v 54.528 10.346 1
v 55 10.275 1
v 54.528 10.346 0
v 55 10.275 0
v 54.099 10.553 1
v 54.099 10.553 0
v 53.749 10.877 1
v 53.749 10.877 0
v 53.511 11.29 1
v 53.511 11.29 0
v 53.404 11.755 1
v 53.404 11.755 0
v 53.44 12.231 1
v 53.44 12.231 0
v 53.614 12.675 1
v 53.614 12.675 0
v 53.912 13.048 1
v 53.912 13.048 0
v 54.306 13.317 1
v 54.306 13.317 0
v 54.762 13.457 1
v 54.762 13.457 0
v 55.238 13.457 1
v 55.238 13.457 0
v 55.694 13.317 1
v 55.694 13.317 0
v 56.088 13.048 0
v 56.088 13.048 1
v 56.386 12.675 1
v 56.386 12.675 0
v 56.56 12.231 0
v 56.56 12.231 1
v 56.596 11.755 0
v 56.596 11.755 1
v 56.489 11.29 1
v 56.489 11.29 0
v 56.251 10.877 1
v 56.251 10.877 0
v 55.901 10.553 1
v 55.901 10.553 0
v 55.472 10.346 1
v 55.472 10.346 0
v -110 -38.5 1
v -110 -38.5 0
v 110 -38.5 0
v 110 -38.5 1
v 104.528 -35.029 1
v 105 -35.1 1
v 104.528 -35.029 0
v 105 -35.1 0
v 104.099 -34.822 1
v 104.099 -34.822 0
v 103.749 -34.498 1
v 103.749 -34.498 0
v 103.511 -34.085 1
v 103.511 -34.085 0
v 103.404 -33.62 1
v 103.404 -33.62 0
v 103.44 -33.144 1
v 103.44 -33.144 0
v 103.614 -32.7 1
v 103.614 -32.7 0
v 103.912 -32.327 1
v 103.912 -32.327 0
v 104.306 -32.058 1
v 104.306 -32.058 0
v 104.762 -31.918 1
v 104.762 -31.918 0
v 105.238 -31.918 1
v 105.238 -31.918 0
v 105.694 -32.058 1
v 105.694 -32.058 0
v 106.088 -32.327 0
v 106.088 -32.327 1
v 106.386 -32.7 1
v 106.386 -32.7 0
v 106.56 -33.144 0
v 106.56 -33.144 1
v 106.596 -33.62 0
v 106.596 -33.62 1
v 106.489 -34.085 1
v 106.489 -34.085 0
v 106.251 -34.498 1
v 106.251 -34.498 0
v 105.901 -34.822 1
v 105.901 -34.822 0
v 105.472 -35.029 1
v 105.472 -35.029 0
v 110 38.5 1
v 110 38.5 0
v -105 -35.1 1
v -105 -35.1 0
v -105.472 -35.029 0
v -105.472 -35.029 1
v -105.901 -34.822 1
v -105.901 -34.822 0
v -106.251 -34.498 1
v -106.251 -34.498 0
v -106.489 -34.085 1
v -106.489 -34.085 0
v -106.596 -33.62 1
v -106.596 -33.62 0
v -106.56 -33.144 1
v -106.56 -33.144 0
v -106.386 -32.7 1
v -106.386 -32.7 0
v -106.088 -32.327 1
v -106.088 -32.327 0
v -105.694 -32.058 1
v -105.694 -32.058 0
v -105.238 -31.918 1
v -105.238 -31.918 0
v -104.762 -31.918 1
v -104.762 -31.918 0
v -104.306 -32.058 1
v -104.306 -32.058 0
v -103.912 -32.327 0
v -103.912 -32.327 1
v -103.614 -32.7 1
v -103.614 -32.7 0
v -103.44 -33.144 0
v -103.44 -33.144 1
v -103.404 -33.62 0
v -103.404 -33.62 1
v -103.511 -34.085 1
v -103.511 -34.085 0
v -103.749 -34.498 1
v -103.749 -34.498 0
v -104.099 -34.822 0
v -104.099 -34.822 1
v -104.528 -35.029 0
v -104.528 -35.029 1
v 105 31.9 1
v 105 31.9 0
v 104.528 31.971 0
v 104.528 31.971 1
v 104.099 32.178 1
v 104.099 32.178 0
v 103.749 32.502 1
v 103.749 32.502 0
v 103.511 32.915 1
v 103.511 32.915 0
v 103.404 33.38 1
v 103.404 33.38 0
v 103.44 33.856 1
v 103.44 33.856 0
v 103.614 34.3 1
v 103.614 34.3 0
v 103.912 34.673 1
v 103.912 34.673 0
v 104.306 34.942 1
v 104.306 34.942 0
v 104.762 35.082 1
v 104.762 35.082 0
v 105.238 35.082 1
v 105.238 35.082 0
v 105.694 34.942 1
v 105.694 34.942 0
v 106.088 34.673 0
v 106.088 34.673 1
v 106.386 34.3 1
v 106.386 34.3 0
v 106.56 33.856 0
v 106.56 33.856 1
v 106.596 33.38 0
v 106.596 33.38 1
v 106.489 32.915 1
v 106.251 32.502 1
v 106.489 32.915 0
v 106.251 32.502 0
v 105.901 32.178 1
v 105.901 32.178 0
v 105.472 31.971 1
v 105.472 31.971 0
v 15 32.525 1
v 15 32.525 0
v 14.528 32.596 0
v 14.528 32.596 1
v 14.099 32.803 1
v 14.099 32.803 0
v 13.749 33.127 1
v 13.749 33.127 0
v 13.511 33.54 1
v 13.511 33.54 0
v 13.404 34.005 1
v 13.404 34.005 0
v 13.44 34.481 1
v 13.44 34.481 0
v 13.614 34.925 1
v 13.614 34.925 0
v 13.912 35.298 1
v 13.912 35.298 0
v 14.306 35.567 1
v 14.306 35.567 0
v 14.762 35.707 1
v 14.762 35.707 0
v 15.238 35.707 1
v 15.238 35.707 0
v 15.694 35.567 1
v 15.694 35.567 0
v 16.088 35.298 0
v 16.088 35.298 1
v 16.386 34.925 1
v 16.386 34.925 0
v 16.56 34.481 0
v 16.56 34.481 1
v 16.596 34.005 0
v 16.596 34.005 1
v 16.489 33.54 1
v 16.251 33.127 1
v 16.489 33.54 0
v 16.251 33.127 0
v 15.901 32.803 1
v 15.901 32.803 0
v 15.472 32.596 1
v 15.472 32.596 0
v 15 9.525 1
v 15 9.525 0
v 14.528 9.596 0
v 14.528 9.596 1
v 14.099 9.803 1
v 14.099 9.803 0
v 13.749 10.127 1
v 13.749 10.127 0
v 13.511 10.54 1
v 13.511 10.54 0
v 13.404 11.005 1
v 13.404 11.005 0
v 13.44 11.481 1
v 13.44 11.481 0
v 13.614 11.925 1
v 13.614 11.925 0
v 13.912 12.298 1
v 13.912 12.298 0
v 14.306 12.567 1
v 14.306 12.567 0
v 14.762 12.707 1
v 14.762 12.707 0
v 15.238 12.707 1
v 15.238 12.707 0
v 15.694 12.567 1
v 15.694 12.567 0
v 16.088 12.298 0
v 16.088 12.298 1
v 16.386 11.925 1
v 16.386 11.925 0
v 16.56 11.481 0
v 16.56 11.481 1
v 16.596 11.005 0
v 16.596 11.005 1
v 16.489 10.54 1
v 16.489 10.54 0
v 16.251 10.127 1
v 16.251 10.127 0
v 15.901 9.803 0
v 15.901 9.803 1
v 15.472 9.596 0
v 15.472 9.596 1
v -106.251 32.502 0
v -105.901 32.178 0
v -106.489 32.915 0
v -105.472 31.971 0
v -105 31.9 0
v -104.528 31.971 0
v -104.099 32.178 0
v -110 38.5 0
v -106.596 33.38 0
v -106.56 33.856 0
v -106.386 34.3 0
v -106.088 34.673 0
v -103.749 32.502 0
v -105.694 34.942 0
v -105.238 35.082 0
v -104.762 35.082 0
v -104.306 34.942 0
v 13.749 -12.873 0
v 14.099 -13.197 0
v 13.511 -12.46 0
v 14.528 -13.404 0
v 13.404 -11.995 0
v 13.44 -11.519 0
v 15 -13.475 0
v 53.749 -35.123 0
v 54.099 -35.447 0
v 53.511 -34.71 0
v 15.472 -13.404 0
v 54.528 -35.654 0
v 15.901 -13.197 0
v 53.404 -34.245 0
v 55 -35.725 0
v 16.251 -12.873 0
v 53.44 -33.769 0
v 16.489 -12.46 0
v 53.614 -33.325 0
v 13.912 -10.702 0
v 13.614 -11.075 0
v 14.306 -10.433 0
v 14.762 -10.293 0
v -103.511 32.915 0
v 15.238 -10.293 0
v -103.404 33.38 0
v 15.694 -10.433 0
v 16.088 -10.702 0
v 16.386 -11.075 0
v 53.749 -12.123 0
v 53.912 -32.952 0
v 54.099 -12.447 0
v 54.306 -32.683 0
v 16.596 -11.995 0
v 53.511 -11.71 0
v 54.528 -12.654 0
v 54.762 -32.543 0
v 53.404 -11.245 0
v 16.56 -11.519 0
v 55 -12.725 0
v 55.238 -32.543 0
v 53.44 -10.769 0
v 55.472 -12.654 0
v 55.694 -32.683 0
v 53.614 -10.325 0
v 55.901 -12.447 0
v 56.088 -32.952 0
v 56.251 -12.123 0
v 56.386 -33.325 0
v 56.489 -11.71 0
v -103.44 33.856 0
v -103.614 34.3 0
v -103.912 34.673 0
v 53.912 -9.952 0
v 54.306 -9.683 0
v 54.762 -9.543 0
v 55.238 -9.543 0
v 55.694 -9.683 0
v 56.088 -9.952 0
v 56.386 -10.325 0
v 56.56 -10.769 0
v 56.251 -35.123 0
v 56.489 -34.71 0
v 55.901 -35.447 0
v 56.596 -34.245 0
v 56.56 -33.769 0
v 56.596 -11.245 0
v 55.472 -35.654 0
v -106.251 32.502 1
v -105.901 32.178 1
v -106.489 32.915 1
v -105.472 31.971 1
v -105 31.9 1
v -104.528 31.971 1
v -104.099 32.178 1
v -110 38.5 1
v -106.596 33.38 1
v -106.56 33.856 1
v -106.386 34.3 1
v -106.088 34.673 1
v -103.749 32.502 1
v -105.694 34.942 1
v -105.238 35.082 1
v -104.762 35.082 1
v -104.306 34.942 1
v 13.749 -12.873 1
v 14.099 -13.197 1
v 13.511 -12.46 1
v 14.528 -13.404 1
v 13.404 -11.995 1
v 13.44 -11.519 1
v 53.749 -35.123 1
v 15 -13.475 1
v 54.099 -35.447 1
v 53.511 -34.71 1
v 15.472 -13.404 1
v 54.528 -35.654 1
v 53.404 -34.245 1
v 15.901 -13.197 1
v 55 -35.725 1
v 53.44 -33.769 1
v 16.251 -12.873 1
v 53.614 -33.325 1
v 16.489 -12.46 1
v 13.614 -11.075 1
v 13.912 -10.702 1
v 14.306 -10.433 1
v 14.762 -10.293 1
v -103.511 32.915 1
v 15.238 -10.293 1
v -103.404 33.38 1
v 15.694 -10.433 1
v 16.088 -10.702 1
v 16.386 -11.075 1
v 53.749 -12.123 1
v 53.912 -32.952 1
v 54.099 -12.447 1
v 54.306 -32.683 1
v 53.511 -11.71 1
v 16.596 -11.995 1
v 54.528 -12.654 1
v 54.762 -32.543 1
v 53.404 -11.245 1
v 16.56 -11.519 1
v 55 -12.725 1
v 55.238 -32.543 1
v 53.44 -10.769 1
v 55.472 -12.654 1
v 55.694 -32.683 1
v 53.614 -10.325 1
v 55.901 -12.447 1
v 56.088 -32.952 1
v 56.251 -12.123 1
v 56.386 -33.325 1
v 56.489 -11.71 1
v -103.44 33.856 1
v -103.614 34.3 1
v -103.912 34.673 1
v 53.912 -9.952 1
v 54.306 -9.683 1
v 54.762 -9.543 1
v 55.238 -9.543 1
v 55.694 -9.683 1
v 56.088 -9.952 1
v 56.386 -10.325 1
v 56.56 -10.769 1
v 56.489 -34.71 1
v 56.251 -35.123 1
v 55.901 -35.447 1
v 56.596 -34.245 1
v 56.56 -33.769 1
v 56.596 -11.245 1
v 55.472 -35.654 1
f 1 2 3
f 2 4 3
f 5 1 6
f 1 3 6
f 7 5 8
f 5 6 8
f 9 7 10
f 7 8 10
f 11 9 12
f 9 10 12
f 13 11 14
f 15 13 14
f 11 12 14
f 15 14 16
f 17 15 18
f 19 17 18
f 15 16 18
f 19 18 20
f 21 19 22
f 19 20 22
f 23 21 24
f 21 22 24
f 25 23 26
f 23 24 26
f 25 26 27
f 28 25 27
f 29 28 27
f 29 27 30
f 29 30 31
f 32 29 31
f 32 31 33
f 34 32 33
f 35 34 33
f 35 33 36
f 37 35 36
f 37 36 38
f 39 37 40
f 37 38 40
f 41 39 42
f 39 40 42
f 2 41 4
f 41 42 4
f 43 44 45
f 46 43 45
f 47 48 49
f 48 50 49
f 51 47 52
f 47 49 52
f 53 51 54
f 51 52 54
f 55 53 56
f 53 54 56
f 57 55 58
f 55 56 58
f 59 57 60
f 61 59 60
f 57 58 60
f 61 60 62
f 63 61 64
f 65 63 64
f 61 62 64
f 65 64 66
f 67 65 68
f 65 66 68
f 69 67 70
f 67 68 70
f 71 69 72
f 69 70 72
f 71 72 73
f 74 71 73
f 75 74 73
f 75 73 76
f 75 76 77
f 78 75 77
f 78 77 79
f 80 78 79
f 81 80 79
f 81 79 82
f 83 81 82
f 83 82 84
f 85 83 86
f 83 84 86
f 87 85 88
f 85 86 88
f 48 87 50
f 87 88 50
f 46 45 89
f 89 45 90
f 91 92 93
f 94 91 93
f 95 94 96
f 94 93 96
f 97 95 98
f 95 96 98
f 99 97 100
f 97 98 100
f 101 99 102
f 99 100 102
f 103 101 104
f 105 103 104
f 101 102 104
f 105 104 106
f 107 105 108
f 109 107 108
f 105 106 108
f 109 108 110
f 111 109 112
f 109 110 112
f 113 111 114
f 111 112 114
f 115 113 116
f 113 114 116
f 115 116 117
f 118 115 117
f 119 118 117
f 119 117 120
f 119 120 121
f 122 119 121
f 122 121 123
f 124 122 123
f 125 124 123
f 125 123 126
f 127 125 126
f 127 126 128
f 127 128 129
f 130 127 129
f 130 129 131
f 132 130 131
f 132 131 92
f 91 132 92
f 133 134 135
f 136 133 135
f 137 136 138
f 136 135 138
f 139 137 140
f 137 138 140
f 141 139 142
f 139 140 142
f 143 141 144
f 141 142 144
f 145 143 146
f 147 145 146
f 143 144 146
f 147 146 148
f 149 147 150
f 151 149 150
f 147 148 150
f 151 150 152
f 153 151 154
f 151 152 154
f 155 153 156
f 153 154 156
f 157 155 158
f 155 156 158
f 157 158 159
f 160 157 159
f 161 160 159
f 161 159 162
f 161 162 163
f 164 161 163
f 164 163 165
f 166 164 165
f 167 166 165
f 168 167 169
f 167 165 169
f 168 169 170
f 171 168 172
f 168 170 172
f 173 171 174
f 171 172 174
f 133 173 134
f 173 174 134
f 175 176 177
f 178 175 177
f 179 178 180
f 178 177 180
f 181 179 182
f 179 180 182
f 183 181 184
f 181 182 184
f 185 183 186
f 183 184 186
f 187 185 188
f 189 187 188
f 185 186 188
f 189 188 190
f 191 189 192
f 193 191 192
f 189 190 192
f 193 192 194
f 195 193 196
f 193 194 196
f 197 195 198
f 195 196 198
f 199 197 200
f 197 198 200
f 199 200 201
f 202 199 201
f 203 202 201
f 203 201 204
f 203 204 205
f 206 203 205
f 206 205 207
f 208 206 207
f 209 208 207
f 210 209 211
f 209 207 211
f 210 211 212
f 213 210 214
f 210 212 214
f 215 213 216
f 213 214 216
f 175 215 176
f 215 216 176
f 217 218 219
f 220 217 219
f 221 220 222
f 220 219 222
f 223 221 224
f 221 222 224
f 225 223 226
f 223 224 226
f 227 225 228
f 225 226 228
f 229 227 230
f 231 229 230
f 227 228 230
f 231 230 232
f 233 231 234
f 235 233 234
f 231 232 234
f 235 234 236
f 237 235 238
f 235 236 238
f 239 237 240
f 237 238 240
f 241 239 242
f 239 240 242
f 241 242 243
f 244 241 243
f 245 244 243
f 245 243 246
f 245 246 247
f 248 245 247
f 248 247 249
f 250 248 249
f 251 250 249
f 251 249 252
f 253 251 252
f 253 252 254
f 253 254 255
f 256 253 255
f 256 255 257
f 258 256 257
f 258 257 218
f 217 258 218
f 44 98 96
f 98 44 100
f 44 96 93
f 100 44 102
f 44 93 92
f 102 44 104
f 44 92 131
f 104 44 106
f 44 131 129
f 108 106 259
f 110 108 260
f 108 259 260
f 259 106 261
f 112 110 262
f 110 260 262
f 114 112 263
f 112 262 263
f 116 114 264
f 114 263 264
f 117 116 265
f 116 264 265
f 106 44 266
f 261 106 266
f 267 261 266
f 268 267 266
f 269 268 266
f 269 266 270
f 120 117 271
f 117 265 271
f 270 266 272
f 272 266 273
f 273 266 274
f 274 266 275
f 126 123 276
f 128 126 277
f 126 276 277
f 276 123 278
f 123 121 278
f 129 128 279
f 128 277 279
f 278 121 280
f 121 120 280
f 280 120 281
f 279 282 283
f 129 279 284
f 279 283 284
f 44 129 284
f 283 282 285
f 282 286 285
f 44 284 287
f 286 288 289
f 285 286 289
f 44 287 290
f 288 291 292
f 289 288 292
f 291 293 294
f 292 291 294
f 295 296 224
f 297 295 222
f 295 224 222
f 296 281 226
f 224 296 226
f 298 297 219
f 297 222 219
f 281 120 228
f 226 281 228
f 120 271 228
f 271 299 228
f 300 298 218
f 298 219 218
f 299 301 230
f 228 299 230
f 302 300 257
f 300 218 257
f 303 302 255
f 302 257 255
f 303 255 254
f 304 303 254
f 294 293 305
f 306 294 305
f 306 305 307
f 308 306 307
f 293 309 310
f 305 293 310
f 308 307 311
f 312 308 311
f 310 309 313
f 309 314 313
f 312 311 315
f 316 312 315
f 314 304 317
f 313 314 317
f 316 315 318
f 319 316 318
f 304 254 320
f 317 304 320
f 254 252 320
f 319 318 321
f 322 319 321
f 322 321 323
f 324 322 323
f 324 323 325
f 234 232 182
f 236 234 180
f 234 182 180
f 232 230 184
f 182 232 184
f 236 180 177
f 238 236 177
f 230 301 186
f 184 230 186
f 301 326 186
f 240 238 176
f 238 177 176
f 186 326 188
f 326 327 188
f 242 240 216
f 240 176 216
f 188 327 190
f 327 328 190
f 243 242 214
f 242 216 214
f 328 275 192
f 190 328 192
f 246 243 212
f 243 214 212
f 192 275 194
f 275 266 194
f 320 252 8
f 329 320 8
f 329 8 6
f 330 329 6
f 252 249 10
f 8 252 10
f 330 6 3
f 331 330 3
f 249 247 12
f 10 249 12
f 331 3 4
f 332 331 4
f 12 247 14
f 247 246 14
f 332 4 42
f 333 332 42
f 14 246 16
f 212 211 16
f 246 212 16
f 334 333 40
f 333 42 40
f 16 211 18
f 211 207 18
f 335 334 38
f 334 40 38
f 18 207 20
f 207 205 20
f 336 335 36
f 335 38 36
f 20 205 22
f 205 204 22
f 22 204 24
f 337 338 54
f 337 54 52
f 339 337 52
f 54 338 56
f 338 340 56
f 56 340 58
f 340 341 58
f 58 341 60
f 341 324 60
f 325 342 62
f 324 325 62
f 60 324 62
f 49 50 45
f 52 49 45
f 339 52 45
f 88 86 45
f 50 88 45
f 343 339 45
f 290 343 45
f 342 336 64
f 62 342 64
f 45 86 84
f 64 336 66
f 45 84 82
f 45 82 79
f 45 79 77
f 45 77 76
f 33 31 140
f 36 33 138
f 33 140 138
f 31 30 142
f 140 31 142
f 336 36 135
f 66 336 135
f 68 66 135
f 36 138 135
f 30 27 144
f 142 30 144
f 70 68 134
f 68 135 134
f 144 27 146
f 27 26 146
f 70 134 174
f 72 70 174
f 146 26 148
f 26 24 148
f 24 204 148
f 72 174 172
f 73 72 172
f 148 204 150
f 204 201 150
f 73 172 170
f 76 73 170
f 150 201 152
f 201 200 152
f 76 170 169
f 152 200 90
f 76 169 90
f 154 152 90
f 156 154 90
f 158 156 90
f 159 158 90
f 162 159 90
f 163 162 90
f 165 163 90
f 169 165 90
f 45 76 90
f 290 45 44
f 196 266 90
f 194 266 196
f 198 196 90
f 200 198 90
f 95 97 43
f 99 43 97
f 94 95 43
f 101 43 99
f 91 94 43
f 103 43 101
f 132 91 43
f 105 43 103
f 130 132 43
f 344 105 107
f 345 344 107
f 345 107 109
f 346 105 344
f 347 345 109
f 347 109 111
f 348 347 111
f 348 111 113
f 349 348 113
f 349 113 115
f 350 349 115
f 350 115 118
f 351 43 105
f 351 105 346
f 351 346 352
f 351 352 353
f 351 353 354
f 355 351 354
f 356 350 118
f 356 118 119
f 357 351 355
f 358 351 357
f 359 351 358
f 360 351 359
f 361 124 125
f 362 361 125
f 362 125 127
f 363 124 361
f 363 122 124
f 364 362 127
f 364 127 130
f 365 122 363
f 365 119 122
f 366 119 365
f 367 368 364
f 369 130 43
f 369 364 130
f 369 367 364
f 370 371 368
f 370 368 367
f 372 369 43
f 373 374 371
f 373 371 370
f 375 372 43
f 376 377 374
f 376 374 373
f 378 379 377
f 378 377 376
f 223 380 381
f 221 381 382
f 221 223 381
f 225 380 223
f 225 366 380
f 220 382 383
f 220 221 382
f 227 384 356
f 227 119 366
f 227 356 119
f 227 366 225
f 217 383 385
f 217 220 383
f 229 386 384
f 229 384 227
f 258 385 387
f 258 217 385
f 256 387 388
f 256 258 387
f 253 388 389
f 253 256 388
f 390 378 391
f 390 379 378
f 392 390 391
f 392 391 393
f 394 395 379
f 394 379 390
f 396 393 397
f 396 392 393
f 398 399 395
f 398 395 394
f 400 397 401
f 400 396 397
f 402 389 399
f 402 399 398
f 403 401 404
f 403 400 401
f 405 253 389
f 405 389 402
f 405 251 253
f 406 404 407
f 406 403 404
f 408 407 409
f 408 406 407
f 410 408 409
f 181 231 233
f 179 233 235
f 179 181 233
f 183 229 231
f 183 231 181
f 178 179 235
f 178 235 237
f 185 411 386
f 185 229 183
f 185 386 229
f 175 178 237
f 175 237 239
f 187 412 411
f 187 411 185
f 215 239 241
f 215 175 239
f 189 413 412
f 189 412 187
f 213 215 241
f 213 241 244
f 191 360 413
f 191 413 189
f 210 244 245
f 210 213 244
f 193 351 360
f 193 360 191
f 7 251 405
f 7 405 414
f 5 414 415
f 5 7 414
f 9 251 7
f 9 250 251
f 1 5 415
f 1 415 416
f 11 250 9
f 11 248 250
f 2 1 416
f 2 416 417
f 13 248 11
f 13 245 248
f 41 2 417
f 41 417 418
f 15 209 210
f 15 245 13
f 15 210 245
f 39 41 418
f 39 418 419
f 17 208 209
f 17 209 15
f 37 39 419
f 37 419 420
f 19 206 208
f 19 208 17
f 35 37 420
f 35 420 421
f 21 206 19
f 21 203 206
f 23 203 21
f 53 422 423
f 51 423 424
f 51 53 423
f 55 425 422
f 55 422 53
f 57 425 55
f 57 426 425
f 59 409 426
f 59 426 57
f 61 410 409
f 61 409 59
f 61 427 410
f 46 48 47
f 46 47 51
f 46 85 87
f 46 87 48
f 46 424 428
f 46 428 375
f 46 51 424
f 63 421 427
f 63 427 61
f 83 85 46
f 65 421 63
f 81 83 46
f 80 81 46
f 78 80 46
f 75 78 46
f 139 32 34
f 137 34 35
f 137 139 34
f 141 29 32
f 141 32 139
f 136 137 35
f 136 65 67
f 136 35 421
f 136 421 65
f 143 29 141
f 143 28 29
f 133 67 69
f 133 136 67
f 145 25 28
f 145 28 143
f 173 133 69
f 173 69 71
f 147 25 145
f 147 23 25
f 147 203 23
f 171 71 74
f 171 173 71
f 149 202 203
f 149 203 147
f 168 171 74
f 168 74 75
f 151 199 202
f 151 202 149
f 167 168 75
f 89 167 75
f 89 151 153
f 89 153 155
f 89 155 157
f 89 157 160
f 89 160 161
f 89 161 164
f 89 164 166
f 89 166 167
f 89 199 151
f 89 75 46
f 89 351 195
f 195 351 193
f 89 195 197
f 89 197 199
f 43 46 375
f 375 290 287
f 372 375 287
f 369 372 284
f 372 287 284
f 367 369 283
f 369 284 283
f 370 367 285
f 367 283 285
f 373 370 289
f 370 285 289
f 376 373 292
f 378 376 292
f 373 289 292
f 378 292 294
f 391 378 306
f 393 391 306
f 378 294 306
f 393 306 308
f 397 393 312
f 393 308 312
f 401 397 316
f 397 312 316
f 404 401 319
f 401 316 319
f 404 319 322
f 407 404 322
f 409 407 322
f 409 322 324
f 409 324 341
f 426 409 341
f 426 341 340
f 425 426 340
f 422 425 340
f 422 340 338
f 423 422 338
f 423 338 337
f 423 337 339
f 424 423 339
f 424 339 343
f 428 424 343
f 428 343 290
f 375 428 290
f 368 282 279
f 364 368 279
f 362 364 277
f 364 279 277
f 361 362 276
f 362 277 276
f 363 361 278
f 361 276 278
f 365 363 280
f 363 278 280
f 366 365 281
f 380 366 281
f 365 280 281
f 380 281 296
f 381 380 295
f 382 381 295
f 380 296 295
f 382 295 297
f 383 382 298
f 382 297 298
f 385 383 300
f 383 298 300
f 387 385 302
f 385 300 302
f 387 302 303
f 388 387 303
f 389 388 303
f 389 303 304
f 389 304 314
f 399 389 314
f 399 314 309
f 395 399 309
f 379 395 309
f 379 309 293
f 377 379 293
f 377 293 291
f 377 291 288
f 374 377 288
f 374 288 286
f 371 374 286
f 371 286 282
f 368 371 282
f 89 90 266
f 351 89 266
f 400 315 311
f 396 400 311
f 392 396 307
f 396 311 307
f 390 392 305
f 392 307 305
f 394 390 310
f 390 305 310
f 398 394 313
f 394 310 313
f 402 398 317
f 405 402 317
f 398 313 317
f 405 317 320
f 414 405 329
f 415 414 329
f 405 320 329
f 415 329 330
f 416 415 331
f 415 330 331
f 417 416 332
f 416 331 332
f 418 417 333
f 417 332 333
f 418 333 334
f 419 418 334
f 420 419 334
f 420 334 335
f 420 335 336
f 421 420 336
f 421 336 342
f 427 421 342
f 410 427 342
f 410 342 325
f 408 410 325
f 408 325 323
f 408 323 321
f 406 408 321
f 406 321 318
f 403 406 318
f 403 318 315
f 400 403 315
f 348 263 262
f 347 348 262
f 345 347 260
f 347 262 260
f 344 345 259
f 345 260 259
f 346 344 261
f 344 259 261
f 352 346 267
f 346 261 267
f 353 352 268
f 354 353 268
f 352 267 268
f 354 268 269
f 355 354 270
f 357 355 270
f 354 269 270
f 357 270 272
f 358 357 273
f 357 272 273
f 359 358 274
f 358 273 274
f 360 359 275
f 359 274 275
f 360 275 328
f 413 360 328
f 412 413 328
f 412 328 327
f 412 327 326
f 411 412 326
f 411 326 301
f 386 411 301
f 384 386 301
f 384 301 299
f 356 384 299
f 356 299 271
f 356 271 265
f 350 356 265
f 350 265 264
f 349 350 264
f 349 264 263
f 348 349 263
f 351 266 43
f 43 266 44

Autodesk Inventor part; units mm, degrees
ref_plane "YZ Plane" through (0, 0, 0) normal (1, 0, 0) x (0, 1, 0)
ref_plane "XZ Plane" through (0, 0, 0) normal (0, 1, 0) x (-1, 0, 0)
ref_plane "XY Plane" through (0, 0, 0) normal (0, 0, 1) x (1, 0, 0)
sketch "スケッチ1" plane through (0, 0, 0) normal (0, 0, 1) x (1, 0, 0)
  line L0 (-110, -38.5) -> (110, -38.5)
  line L1 (110, -38.5) -> (110, 38.5)
  line L2 (110, 38.5) -> (-110, 38.5)
  line L3 (-110, 38.5) -> (-110, -38.5)
  line L4 (-110, -38.5) -> (110, 38.5) construction
  line L5 (110, -38.5) -> (-110, 38.5) construction
  point P0 (0, 0)
  dimension "d0" = 220
  dimension "d1" = 77
extrude "プレート1" add sketch "スケッチ1" along normal blind 1
sketch "スケッチ2" plane through (0, 0, 1) normal (0, 0, 1) x (1, 0, 0)
  line L0 (-110, -38.5) -> (-110, 38.5) projected
  line L1 (110, -38.5) -> (-110, -38.5) projected
  line L2 (110, 38.5) -> (110, -38.5) projected
  line L3 (-110, 38.5) -> (110, 38.5) projected
  line L4 (105, 33.5) -> (105, -33.5)
  line L5 (105, -33.5) -> (-105, -33.5)
  line L6 (-105, -33.5) -> (-105, 33.5)
  line L7 (-105, 33.5) -> (105, 33.5)
  point P0 (0, 0)
  dimension "d3" = 5
hole "穴1" at (-105, 33.5, 1) at (-105, -33.5, 1) at (105, -33.5, 1) at (105, 33.5, 1) direction (0, 0, -1) diameter 3.2 depth 1 clearance for "Flat Head Machine Screw" size "M3" standard "Ansi Metric M Profile"
sketch "スケッチ3" plane through (0, 0, 1) normal (0, 0, 1) x (1, 0, 0)
  line L0 (55, -34.125) -> (15, -34.125)
  line L1 (15, -34.125) -> (15, -11.875)
  line L2 (15, -11.875) -> (55, -11.875)
  line L3 (55, -11.875) -> (55, -34.125)
  line L4 (55, -34.125) -> (15, -11.875) construction
  line L5 (15, -34.125) -> (55, -11.875) construction
  line L6 (15, 11.125) -> (55, 11.125)
  line L7 (55, 11.125) -> (55, -11.125)
  line L8 (55, -11.125) -> (15, -11.125)
  line L9 (15, -11.125) -> (15, 11.125)
  line L10 (15, 11.125) -> (55, -11.125) construction
  line L11 (55, 11.125) -> (15, -11.125) construction
  line L12 (15, 11.875) -> (55, 11.875)
  line L13 (55, 11.875) -> (55, 34.125)
  line L14 (55, 34.125) -> (15, 34.125)
  line L15 (15, 34.125) -> (15, 11.875)
  line L16 (15, 11.875) -> (55, 34.125) construction
  line L17 (55, 11.875) -> (15, 34.125) construction
  point P0 (0, 0)
  point P1 (35, -23)
  point P2 (35, 0)
  point P3 (35, 0)
  point P4 (35, 23)
  point P5 (35, 23)
  point P6 (35, 0)
  point P7 (35, -23)
  dimension "d11" = 22.25
  dimension "d12" = 40
  dimension "d13" = 40
  dimension "d14" = 22.25
  dimension "d15" = 40
  dimension "d16" = 22.25
  dimension "d17" = 23
  dimension "d18" = 23
  dimension "d20" = 35
hole "穴2" at (15, 34.125, 1) at (55, 11.875, 1) at (15, 11.125, 1) at (55, -11.125, 1) at (15, -11.875, 1) at (55, -34.125, 1) direction (0, 0, -1) diameter 3.2 end through all clearance for "Flat Head Machine Screw" size "M3" standard "Ansi Metric M Profile"
equation "\"d9\" = Thickness"
equation "\"d26\" = Thickness"
equation "\"d2\" = Thickness"
equation "\"BendRadius\" = Thickness"
equation "\"BendReliefWidth\" = Thickness"
equation "\"BendReliefDepth\" = 0.5 * Thickness"
equation "\"CornerReliefSize\" = 4 * Thickness"
equation "\"MinimumRemnant\" = 2 * Thickness"
equation "\"TransitionRadius\" = BendRadius"
equation "\"JacobiRadiusSize\" = Thickness"
equation "\"GapSize\" = Thickness"
equation "\"Thickness\" = 1"
properties part number "plate3" material "CFRP"
